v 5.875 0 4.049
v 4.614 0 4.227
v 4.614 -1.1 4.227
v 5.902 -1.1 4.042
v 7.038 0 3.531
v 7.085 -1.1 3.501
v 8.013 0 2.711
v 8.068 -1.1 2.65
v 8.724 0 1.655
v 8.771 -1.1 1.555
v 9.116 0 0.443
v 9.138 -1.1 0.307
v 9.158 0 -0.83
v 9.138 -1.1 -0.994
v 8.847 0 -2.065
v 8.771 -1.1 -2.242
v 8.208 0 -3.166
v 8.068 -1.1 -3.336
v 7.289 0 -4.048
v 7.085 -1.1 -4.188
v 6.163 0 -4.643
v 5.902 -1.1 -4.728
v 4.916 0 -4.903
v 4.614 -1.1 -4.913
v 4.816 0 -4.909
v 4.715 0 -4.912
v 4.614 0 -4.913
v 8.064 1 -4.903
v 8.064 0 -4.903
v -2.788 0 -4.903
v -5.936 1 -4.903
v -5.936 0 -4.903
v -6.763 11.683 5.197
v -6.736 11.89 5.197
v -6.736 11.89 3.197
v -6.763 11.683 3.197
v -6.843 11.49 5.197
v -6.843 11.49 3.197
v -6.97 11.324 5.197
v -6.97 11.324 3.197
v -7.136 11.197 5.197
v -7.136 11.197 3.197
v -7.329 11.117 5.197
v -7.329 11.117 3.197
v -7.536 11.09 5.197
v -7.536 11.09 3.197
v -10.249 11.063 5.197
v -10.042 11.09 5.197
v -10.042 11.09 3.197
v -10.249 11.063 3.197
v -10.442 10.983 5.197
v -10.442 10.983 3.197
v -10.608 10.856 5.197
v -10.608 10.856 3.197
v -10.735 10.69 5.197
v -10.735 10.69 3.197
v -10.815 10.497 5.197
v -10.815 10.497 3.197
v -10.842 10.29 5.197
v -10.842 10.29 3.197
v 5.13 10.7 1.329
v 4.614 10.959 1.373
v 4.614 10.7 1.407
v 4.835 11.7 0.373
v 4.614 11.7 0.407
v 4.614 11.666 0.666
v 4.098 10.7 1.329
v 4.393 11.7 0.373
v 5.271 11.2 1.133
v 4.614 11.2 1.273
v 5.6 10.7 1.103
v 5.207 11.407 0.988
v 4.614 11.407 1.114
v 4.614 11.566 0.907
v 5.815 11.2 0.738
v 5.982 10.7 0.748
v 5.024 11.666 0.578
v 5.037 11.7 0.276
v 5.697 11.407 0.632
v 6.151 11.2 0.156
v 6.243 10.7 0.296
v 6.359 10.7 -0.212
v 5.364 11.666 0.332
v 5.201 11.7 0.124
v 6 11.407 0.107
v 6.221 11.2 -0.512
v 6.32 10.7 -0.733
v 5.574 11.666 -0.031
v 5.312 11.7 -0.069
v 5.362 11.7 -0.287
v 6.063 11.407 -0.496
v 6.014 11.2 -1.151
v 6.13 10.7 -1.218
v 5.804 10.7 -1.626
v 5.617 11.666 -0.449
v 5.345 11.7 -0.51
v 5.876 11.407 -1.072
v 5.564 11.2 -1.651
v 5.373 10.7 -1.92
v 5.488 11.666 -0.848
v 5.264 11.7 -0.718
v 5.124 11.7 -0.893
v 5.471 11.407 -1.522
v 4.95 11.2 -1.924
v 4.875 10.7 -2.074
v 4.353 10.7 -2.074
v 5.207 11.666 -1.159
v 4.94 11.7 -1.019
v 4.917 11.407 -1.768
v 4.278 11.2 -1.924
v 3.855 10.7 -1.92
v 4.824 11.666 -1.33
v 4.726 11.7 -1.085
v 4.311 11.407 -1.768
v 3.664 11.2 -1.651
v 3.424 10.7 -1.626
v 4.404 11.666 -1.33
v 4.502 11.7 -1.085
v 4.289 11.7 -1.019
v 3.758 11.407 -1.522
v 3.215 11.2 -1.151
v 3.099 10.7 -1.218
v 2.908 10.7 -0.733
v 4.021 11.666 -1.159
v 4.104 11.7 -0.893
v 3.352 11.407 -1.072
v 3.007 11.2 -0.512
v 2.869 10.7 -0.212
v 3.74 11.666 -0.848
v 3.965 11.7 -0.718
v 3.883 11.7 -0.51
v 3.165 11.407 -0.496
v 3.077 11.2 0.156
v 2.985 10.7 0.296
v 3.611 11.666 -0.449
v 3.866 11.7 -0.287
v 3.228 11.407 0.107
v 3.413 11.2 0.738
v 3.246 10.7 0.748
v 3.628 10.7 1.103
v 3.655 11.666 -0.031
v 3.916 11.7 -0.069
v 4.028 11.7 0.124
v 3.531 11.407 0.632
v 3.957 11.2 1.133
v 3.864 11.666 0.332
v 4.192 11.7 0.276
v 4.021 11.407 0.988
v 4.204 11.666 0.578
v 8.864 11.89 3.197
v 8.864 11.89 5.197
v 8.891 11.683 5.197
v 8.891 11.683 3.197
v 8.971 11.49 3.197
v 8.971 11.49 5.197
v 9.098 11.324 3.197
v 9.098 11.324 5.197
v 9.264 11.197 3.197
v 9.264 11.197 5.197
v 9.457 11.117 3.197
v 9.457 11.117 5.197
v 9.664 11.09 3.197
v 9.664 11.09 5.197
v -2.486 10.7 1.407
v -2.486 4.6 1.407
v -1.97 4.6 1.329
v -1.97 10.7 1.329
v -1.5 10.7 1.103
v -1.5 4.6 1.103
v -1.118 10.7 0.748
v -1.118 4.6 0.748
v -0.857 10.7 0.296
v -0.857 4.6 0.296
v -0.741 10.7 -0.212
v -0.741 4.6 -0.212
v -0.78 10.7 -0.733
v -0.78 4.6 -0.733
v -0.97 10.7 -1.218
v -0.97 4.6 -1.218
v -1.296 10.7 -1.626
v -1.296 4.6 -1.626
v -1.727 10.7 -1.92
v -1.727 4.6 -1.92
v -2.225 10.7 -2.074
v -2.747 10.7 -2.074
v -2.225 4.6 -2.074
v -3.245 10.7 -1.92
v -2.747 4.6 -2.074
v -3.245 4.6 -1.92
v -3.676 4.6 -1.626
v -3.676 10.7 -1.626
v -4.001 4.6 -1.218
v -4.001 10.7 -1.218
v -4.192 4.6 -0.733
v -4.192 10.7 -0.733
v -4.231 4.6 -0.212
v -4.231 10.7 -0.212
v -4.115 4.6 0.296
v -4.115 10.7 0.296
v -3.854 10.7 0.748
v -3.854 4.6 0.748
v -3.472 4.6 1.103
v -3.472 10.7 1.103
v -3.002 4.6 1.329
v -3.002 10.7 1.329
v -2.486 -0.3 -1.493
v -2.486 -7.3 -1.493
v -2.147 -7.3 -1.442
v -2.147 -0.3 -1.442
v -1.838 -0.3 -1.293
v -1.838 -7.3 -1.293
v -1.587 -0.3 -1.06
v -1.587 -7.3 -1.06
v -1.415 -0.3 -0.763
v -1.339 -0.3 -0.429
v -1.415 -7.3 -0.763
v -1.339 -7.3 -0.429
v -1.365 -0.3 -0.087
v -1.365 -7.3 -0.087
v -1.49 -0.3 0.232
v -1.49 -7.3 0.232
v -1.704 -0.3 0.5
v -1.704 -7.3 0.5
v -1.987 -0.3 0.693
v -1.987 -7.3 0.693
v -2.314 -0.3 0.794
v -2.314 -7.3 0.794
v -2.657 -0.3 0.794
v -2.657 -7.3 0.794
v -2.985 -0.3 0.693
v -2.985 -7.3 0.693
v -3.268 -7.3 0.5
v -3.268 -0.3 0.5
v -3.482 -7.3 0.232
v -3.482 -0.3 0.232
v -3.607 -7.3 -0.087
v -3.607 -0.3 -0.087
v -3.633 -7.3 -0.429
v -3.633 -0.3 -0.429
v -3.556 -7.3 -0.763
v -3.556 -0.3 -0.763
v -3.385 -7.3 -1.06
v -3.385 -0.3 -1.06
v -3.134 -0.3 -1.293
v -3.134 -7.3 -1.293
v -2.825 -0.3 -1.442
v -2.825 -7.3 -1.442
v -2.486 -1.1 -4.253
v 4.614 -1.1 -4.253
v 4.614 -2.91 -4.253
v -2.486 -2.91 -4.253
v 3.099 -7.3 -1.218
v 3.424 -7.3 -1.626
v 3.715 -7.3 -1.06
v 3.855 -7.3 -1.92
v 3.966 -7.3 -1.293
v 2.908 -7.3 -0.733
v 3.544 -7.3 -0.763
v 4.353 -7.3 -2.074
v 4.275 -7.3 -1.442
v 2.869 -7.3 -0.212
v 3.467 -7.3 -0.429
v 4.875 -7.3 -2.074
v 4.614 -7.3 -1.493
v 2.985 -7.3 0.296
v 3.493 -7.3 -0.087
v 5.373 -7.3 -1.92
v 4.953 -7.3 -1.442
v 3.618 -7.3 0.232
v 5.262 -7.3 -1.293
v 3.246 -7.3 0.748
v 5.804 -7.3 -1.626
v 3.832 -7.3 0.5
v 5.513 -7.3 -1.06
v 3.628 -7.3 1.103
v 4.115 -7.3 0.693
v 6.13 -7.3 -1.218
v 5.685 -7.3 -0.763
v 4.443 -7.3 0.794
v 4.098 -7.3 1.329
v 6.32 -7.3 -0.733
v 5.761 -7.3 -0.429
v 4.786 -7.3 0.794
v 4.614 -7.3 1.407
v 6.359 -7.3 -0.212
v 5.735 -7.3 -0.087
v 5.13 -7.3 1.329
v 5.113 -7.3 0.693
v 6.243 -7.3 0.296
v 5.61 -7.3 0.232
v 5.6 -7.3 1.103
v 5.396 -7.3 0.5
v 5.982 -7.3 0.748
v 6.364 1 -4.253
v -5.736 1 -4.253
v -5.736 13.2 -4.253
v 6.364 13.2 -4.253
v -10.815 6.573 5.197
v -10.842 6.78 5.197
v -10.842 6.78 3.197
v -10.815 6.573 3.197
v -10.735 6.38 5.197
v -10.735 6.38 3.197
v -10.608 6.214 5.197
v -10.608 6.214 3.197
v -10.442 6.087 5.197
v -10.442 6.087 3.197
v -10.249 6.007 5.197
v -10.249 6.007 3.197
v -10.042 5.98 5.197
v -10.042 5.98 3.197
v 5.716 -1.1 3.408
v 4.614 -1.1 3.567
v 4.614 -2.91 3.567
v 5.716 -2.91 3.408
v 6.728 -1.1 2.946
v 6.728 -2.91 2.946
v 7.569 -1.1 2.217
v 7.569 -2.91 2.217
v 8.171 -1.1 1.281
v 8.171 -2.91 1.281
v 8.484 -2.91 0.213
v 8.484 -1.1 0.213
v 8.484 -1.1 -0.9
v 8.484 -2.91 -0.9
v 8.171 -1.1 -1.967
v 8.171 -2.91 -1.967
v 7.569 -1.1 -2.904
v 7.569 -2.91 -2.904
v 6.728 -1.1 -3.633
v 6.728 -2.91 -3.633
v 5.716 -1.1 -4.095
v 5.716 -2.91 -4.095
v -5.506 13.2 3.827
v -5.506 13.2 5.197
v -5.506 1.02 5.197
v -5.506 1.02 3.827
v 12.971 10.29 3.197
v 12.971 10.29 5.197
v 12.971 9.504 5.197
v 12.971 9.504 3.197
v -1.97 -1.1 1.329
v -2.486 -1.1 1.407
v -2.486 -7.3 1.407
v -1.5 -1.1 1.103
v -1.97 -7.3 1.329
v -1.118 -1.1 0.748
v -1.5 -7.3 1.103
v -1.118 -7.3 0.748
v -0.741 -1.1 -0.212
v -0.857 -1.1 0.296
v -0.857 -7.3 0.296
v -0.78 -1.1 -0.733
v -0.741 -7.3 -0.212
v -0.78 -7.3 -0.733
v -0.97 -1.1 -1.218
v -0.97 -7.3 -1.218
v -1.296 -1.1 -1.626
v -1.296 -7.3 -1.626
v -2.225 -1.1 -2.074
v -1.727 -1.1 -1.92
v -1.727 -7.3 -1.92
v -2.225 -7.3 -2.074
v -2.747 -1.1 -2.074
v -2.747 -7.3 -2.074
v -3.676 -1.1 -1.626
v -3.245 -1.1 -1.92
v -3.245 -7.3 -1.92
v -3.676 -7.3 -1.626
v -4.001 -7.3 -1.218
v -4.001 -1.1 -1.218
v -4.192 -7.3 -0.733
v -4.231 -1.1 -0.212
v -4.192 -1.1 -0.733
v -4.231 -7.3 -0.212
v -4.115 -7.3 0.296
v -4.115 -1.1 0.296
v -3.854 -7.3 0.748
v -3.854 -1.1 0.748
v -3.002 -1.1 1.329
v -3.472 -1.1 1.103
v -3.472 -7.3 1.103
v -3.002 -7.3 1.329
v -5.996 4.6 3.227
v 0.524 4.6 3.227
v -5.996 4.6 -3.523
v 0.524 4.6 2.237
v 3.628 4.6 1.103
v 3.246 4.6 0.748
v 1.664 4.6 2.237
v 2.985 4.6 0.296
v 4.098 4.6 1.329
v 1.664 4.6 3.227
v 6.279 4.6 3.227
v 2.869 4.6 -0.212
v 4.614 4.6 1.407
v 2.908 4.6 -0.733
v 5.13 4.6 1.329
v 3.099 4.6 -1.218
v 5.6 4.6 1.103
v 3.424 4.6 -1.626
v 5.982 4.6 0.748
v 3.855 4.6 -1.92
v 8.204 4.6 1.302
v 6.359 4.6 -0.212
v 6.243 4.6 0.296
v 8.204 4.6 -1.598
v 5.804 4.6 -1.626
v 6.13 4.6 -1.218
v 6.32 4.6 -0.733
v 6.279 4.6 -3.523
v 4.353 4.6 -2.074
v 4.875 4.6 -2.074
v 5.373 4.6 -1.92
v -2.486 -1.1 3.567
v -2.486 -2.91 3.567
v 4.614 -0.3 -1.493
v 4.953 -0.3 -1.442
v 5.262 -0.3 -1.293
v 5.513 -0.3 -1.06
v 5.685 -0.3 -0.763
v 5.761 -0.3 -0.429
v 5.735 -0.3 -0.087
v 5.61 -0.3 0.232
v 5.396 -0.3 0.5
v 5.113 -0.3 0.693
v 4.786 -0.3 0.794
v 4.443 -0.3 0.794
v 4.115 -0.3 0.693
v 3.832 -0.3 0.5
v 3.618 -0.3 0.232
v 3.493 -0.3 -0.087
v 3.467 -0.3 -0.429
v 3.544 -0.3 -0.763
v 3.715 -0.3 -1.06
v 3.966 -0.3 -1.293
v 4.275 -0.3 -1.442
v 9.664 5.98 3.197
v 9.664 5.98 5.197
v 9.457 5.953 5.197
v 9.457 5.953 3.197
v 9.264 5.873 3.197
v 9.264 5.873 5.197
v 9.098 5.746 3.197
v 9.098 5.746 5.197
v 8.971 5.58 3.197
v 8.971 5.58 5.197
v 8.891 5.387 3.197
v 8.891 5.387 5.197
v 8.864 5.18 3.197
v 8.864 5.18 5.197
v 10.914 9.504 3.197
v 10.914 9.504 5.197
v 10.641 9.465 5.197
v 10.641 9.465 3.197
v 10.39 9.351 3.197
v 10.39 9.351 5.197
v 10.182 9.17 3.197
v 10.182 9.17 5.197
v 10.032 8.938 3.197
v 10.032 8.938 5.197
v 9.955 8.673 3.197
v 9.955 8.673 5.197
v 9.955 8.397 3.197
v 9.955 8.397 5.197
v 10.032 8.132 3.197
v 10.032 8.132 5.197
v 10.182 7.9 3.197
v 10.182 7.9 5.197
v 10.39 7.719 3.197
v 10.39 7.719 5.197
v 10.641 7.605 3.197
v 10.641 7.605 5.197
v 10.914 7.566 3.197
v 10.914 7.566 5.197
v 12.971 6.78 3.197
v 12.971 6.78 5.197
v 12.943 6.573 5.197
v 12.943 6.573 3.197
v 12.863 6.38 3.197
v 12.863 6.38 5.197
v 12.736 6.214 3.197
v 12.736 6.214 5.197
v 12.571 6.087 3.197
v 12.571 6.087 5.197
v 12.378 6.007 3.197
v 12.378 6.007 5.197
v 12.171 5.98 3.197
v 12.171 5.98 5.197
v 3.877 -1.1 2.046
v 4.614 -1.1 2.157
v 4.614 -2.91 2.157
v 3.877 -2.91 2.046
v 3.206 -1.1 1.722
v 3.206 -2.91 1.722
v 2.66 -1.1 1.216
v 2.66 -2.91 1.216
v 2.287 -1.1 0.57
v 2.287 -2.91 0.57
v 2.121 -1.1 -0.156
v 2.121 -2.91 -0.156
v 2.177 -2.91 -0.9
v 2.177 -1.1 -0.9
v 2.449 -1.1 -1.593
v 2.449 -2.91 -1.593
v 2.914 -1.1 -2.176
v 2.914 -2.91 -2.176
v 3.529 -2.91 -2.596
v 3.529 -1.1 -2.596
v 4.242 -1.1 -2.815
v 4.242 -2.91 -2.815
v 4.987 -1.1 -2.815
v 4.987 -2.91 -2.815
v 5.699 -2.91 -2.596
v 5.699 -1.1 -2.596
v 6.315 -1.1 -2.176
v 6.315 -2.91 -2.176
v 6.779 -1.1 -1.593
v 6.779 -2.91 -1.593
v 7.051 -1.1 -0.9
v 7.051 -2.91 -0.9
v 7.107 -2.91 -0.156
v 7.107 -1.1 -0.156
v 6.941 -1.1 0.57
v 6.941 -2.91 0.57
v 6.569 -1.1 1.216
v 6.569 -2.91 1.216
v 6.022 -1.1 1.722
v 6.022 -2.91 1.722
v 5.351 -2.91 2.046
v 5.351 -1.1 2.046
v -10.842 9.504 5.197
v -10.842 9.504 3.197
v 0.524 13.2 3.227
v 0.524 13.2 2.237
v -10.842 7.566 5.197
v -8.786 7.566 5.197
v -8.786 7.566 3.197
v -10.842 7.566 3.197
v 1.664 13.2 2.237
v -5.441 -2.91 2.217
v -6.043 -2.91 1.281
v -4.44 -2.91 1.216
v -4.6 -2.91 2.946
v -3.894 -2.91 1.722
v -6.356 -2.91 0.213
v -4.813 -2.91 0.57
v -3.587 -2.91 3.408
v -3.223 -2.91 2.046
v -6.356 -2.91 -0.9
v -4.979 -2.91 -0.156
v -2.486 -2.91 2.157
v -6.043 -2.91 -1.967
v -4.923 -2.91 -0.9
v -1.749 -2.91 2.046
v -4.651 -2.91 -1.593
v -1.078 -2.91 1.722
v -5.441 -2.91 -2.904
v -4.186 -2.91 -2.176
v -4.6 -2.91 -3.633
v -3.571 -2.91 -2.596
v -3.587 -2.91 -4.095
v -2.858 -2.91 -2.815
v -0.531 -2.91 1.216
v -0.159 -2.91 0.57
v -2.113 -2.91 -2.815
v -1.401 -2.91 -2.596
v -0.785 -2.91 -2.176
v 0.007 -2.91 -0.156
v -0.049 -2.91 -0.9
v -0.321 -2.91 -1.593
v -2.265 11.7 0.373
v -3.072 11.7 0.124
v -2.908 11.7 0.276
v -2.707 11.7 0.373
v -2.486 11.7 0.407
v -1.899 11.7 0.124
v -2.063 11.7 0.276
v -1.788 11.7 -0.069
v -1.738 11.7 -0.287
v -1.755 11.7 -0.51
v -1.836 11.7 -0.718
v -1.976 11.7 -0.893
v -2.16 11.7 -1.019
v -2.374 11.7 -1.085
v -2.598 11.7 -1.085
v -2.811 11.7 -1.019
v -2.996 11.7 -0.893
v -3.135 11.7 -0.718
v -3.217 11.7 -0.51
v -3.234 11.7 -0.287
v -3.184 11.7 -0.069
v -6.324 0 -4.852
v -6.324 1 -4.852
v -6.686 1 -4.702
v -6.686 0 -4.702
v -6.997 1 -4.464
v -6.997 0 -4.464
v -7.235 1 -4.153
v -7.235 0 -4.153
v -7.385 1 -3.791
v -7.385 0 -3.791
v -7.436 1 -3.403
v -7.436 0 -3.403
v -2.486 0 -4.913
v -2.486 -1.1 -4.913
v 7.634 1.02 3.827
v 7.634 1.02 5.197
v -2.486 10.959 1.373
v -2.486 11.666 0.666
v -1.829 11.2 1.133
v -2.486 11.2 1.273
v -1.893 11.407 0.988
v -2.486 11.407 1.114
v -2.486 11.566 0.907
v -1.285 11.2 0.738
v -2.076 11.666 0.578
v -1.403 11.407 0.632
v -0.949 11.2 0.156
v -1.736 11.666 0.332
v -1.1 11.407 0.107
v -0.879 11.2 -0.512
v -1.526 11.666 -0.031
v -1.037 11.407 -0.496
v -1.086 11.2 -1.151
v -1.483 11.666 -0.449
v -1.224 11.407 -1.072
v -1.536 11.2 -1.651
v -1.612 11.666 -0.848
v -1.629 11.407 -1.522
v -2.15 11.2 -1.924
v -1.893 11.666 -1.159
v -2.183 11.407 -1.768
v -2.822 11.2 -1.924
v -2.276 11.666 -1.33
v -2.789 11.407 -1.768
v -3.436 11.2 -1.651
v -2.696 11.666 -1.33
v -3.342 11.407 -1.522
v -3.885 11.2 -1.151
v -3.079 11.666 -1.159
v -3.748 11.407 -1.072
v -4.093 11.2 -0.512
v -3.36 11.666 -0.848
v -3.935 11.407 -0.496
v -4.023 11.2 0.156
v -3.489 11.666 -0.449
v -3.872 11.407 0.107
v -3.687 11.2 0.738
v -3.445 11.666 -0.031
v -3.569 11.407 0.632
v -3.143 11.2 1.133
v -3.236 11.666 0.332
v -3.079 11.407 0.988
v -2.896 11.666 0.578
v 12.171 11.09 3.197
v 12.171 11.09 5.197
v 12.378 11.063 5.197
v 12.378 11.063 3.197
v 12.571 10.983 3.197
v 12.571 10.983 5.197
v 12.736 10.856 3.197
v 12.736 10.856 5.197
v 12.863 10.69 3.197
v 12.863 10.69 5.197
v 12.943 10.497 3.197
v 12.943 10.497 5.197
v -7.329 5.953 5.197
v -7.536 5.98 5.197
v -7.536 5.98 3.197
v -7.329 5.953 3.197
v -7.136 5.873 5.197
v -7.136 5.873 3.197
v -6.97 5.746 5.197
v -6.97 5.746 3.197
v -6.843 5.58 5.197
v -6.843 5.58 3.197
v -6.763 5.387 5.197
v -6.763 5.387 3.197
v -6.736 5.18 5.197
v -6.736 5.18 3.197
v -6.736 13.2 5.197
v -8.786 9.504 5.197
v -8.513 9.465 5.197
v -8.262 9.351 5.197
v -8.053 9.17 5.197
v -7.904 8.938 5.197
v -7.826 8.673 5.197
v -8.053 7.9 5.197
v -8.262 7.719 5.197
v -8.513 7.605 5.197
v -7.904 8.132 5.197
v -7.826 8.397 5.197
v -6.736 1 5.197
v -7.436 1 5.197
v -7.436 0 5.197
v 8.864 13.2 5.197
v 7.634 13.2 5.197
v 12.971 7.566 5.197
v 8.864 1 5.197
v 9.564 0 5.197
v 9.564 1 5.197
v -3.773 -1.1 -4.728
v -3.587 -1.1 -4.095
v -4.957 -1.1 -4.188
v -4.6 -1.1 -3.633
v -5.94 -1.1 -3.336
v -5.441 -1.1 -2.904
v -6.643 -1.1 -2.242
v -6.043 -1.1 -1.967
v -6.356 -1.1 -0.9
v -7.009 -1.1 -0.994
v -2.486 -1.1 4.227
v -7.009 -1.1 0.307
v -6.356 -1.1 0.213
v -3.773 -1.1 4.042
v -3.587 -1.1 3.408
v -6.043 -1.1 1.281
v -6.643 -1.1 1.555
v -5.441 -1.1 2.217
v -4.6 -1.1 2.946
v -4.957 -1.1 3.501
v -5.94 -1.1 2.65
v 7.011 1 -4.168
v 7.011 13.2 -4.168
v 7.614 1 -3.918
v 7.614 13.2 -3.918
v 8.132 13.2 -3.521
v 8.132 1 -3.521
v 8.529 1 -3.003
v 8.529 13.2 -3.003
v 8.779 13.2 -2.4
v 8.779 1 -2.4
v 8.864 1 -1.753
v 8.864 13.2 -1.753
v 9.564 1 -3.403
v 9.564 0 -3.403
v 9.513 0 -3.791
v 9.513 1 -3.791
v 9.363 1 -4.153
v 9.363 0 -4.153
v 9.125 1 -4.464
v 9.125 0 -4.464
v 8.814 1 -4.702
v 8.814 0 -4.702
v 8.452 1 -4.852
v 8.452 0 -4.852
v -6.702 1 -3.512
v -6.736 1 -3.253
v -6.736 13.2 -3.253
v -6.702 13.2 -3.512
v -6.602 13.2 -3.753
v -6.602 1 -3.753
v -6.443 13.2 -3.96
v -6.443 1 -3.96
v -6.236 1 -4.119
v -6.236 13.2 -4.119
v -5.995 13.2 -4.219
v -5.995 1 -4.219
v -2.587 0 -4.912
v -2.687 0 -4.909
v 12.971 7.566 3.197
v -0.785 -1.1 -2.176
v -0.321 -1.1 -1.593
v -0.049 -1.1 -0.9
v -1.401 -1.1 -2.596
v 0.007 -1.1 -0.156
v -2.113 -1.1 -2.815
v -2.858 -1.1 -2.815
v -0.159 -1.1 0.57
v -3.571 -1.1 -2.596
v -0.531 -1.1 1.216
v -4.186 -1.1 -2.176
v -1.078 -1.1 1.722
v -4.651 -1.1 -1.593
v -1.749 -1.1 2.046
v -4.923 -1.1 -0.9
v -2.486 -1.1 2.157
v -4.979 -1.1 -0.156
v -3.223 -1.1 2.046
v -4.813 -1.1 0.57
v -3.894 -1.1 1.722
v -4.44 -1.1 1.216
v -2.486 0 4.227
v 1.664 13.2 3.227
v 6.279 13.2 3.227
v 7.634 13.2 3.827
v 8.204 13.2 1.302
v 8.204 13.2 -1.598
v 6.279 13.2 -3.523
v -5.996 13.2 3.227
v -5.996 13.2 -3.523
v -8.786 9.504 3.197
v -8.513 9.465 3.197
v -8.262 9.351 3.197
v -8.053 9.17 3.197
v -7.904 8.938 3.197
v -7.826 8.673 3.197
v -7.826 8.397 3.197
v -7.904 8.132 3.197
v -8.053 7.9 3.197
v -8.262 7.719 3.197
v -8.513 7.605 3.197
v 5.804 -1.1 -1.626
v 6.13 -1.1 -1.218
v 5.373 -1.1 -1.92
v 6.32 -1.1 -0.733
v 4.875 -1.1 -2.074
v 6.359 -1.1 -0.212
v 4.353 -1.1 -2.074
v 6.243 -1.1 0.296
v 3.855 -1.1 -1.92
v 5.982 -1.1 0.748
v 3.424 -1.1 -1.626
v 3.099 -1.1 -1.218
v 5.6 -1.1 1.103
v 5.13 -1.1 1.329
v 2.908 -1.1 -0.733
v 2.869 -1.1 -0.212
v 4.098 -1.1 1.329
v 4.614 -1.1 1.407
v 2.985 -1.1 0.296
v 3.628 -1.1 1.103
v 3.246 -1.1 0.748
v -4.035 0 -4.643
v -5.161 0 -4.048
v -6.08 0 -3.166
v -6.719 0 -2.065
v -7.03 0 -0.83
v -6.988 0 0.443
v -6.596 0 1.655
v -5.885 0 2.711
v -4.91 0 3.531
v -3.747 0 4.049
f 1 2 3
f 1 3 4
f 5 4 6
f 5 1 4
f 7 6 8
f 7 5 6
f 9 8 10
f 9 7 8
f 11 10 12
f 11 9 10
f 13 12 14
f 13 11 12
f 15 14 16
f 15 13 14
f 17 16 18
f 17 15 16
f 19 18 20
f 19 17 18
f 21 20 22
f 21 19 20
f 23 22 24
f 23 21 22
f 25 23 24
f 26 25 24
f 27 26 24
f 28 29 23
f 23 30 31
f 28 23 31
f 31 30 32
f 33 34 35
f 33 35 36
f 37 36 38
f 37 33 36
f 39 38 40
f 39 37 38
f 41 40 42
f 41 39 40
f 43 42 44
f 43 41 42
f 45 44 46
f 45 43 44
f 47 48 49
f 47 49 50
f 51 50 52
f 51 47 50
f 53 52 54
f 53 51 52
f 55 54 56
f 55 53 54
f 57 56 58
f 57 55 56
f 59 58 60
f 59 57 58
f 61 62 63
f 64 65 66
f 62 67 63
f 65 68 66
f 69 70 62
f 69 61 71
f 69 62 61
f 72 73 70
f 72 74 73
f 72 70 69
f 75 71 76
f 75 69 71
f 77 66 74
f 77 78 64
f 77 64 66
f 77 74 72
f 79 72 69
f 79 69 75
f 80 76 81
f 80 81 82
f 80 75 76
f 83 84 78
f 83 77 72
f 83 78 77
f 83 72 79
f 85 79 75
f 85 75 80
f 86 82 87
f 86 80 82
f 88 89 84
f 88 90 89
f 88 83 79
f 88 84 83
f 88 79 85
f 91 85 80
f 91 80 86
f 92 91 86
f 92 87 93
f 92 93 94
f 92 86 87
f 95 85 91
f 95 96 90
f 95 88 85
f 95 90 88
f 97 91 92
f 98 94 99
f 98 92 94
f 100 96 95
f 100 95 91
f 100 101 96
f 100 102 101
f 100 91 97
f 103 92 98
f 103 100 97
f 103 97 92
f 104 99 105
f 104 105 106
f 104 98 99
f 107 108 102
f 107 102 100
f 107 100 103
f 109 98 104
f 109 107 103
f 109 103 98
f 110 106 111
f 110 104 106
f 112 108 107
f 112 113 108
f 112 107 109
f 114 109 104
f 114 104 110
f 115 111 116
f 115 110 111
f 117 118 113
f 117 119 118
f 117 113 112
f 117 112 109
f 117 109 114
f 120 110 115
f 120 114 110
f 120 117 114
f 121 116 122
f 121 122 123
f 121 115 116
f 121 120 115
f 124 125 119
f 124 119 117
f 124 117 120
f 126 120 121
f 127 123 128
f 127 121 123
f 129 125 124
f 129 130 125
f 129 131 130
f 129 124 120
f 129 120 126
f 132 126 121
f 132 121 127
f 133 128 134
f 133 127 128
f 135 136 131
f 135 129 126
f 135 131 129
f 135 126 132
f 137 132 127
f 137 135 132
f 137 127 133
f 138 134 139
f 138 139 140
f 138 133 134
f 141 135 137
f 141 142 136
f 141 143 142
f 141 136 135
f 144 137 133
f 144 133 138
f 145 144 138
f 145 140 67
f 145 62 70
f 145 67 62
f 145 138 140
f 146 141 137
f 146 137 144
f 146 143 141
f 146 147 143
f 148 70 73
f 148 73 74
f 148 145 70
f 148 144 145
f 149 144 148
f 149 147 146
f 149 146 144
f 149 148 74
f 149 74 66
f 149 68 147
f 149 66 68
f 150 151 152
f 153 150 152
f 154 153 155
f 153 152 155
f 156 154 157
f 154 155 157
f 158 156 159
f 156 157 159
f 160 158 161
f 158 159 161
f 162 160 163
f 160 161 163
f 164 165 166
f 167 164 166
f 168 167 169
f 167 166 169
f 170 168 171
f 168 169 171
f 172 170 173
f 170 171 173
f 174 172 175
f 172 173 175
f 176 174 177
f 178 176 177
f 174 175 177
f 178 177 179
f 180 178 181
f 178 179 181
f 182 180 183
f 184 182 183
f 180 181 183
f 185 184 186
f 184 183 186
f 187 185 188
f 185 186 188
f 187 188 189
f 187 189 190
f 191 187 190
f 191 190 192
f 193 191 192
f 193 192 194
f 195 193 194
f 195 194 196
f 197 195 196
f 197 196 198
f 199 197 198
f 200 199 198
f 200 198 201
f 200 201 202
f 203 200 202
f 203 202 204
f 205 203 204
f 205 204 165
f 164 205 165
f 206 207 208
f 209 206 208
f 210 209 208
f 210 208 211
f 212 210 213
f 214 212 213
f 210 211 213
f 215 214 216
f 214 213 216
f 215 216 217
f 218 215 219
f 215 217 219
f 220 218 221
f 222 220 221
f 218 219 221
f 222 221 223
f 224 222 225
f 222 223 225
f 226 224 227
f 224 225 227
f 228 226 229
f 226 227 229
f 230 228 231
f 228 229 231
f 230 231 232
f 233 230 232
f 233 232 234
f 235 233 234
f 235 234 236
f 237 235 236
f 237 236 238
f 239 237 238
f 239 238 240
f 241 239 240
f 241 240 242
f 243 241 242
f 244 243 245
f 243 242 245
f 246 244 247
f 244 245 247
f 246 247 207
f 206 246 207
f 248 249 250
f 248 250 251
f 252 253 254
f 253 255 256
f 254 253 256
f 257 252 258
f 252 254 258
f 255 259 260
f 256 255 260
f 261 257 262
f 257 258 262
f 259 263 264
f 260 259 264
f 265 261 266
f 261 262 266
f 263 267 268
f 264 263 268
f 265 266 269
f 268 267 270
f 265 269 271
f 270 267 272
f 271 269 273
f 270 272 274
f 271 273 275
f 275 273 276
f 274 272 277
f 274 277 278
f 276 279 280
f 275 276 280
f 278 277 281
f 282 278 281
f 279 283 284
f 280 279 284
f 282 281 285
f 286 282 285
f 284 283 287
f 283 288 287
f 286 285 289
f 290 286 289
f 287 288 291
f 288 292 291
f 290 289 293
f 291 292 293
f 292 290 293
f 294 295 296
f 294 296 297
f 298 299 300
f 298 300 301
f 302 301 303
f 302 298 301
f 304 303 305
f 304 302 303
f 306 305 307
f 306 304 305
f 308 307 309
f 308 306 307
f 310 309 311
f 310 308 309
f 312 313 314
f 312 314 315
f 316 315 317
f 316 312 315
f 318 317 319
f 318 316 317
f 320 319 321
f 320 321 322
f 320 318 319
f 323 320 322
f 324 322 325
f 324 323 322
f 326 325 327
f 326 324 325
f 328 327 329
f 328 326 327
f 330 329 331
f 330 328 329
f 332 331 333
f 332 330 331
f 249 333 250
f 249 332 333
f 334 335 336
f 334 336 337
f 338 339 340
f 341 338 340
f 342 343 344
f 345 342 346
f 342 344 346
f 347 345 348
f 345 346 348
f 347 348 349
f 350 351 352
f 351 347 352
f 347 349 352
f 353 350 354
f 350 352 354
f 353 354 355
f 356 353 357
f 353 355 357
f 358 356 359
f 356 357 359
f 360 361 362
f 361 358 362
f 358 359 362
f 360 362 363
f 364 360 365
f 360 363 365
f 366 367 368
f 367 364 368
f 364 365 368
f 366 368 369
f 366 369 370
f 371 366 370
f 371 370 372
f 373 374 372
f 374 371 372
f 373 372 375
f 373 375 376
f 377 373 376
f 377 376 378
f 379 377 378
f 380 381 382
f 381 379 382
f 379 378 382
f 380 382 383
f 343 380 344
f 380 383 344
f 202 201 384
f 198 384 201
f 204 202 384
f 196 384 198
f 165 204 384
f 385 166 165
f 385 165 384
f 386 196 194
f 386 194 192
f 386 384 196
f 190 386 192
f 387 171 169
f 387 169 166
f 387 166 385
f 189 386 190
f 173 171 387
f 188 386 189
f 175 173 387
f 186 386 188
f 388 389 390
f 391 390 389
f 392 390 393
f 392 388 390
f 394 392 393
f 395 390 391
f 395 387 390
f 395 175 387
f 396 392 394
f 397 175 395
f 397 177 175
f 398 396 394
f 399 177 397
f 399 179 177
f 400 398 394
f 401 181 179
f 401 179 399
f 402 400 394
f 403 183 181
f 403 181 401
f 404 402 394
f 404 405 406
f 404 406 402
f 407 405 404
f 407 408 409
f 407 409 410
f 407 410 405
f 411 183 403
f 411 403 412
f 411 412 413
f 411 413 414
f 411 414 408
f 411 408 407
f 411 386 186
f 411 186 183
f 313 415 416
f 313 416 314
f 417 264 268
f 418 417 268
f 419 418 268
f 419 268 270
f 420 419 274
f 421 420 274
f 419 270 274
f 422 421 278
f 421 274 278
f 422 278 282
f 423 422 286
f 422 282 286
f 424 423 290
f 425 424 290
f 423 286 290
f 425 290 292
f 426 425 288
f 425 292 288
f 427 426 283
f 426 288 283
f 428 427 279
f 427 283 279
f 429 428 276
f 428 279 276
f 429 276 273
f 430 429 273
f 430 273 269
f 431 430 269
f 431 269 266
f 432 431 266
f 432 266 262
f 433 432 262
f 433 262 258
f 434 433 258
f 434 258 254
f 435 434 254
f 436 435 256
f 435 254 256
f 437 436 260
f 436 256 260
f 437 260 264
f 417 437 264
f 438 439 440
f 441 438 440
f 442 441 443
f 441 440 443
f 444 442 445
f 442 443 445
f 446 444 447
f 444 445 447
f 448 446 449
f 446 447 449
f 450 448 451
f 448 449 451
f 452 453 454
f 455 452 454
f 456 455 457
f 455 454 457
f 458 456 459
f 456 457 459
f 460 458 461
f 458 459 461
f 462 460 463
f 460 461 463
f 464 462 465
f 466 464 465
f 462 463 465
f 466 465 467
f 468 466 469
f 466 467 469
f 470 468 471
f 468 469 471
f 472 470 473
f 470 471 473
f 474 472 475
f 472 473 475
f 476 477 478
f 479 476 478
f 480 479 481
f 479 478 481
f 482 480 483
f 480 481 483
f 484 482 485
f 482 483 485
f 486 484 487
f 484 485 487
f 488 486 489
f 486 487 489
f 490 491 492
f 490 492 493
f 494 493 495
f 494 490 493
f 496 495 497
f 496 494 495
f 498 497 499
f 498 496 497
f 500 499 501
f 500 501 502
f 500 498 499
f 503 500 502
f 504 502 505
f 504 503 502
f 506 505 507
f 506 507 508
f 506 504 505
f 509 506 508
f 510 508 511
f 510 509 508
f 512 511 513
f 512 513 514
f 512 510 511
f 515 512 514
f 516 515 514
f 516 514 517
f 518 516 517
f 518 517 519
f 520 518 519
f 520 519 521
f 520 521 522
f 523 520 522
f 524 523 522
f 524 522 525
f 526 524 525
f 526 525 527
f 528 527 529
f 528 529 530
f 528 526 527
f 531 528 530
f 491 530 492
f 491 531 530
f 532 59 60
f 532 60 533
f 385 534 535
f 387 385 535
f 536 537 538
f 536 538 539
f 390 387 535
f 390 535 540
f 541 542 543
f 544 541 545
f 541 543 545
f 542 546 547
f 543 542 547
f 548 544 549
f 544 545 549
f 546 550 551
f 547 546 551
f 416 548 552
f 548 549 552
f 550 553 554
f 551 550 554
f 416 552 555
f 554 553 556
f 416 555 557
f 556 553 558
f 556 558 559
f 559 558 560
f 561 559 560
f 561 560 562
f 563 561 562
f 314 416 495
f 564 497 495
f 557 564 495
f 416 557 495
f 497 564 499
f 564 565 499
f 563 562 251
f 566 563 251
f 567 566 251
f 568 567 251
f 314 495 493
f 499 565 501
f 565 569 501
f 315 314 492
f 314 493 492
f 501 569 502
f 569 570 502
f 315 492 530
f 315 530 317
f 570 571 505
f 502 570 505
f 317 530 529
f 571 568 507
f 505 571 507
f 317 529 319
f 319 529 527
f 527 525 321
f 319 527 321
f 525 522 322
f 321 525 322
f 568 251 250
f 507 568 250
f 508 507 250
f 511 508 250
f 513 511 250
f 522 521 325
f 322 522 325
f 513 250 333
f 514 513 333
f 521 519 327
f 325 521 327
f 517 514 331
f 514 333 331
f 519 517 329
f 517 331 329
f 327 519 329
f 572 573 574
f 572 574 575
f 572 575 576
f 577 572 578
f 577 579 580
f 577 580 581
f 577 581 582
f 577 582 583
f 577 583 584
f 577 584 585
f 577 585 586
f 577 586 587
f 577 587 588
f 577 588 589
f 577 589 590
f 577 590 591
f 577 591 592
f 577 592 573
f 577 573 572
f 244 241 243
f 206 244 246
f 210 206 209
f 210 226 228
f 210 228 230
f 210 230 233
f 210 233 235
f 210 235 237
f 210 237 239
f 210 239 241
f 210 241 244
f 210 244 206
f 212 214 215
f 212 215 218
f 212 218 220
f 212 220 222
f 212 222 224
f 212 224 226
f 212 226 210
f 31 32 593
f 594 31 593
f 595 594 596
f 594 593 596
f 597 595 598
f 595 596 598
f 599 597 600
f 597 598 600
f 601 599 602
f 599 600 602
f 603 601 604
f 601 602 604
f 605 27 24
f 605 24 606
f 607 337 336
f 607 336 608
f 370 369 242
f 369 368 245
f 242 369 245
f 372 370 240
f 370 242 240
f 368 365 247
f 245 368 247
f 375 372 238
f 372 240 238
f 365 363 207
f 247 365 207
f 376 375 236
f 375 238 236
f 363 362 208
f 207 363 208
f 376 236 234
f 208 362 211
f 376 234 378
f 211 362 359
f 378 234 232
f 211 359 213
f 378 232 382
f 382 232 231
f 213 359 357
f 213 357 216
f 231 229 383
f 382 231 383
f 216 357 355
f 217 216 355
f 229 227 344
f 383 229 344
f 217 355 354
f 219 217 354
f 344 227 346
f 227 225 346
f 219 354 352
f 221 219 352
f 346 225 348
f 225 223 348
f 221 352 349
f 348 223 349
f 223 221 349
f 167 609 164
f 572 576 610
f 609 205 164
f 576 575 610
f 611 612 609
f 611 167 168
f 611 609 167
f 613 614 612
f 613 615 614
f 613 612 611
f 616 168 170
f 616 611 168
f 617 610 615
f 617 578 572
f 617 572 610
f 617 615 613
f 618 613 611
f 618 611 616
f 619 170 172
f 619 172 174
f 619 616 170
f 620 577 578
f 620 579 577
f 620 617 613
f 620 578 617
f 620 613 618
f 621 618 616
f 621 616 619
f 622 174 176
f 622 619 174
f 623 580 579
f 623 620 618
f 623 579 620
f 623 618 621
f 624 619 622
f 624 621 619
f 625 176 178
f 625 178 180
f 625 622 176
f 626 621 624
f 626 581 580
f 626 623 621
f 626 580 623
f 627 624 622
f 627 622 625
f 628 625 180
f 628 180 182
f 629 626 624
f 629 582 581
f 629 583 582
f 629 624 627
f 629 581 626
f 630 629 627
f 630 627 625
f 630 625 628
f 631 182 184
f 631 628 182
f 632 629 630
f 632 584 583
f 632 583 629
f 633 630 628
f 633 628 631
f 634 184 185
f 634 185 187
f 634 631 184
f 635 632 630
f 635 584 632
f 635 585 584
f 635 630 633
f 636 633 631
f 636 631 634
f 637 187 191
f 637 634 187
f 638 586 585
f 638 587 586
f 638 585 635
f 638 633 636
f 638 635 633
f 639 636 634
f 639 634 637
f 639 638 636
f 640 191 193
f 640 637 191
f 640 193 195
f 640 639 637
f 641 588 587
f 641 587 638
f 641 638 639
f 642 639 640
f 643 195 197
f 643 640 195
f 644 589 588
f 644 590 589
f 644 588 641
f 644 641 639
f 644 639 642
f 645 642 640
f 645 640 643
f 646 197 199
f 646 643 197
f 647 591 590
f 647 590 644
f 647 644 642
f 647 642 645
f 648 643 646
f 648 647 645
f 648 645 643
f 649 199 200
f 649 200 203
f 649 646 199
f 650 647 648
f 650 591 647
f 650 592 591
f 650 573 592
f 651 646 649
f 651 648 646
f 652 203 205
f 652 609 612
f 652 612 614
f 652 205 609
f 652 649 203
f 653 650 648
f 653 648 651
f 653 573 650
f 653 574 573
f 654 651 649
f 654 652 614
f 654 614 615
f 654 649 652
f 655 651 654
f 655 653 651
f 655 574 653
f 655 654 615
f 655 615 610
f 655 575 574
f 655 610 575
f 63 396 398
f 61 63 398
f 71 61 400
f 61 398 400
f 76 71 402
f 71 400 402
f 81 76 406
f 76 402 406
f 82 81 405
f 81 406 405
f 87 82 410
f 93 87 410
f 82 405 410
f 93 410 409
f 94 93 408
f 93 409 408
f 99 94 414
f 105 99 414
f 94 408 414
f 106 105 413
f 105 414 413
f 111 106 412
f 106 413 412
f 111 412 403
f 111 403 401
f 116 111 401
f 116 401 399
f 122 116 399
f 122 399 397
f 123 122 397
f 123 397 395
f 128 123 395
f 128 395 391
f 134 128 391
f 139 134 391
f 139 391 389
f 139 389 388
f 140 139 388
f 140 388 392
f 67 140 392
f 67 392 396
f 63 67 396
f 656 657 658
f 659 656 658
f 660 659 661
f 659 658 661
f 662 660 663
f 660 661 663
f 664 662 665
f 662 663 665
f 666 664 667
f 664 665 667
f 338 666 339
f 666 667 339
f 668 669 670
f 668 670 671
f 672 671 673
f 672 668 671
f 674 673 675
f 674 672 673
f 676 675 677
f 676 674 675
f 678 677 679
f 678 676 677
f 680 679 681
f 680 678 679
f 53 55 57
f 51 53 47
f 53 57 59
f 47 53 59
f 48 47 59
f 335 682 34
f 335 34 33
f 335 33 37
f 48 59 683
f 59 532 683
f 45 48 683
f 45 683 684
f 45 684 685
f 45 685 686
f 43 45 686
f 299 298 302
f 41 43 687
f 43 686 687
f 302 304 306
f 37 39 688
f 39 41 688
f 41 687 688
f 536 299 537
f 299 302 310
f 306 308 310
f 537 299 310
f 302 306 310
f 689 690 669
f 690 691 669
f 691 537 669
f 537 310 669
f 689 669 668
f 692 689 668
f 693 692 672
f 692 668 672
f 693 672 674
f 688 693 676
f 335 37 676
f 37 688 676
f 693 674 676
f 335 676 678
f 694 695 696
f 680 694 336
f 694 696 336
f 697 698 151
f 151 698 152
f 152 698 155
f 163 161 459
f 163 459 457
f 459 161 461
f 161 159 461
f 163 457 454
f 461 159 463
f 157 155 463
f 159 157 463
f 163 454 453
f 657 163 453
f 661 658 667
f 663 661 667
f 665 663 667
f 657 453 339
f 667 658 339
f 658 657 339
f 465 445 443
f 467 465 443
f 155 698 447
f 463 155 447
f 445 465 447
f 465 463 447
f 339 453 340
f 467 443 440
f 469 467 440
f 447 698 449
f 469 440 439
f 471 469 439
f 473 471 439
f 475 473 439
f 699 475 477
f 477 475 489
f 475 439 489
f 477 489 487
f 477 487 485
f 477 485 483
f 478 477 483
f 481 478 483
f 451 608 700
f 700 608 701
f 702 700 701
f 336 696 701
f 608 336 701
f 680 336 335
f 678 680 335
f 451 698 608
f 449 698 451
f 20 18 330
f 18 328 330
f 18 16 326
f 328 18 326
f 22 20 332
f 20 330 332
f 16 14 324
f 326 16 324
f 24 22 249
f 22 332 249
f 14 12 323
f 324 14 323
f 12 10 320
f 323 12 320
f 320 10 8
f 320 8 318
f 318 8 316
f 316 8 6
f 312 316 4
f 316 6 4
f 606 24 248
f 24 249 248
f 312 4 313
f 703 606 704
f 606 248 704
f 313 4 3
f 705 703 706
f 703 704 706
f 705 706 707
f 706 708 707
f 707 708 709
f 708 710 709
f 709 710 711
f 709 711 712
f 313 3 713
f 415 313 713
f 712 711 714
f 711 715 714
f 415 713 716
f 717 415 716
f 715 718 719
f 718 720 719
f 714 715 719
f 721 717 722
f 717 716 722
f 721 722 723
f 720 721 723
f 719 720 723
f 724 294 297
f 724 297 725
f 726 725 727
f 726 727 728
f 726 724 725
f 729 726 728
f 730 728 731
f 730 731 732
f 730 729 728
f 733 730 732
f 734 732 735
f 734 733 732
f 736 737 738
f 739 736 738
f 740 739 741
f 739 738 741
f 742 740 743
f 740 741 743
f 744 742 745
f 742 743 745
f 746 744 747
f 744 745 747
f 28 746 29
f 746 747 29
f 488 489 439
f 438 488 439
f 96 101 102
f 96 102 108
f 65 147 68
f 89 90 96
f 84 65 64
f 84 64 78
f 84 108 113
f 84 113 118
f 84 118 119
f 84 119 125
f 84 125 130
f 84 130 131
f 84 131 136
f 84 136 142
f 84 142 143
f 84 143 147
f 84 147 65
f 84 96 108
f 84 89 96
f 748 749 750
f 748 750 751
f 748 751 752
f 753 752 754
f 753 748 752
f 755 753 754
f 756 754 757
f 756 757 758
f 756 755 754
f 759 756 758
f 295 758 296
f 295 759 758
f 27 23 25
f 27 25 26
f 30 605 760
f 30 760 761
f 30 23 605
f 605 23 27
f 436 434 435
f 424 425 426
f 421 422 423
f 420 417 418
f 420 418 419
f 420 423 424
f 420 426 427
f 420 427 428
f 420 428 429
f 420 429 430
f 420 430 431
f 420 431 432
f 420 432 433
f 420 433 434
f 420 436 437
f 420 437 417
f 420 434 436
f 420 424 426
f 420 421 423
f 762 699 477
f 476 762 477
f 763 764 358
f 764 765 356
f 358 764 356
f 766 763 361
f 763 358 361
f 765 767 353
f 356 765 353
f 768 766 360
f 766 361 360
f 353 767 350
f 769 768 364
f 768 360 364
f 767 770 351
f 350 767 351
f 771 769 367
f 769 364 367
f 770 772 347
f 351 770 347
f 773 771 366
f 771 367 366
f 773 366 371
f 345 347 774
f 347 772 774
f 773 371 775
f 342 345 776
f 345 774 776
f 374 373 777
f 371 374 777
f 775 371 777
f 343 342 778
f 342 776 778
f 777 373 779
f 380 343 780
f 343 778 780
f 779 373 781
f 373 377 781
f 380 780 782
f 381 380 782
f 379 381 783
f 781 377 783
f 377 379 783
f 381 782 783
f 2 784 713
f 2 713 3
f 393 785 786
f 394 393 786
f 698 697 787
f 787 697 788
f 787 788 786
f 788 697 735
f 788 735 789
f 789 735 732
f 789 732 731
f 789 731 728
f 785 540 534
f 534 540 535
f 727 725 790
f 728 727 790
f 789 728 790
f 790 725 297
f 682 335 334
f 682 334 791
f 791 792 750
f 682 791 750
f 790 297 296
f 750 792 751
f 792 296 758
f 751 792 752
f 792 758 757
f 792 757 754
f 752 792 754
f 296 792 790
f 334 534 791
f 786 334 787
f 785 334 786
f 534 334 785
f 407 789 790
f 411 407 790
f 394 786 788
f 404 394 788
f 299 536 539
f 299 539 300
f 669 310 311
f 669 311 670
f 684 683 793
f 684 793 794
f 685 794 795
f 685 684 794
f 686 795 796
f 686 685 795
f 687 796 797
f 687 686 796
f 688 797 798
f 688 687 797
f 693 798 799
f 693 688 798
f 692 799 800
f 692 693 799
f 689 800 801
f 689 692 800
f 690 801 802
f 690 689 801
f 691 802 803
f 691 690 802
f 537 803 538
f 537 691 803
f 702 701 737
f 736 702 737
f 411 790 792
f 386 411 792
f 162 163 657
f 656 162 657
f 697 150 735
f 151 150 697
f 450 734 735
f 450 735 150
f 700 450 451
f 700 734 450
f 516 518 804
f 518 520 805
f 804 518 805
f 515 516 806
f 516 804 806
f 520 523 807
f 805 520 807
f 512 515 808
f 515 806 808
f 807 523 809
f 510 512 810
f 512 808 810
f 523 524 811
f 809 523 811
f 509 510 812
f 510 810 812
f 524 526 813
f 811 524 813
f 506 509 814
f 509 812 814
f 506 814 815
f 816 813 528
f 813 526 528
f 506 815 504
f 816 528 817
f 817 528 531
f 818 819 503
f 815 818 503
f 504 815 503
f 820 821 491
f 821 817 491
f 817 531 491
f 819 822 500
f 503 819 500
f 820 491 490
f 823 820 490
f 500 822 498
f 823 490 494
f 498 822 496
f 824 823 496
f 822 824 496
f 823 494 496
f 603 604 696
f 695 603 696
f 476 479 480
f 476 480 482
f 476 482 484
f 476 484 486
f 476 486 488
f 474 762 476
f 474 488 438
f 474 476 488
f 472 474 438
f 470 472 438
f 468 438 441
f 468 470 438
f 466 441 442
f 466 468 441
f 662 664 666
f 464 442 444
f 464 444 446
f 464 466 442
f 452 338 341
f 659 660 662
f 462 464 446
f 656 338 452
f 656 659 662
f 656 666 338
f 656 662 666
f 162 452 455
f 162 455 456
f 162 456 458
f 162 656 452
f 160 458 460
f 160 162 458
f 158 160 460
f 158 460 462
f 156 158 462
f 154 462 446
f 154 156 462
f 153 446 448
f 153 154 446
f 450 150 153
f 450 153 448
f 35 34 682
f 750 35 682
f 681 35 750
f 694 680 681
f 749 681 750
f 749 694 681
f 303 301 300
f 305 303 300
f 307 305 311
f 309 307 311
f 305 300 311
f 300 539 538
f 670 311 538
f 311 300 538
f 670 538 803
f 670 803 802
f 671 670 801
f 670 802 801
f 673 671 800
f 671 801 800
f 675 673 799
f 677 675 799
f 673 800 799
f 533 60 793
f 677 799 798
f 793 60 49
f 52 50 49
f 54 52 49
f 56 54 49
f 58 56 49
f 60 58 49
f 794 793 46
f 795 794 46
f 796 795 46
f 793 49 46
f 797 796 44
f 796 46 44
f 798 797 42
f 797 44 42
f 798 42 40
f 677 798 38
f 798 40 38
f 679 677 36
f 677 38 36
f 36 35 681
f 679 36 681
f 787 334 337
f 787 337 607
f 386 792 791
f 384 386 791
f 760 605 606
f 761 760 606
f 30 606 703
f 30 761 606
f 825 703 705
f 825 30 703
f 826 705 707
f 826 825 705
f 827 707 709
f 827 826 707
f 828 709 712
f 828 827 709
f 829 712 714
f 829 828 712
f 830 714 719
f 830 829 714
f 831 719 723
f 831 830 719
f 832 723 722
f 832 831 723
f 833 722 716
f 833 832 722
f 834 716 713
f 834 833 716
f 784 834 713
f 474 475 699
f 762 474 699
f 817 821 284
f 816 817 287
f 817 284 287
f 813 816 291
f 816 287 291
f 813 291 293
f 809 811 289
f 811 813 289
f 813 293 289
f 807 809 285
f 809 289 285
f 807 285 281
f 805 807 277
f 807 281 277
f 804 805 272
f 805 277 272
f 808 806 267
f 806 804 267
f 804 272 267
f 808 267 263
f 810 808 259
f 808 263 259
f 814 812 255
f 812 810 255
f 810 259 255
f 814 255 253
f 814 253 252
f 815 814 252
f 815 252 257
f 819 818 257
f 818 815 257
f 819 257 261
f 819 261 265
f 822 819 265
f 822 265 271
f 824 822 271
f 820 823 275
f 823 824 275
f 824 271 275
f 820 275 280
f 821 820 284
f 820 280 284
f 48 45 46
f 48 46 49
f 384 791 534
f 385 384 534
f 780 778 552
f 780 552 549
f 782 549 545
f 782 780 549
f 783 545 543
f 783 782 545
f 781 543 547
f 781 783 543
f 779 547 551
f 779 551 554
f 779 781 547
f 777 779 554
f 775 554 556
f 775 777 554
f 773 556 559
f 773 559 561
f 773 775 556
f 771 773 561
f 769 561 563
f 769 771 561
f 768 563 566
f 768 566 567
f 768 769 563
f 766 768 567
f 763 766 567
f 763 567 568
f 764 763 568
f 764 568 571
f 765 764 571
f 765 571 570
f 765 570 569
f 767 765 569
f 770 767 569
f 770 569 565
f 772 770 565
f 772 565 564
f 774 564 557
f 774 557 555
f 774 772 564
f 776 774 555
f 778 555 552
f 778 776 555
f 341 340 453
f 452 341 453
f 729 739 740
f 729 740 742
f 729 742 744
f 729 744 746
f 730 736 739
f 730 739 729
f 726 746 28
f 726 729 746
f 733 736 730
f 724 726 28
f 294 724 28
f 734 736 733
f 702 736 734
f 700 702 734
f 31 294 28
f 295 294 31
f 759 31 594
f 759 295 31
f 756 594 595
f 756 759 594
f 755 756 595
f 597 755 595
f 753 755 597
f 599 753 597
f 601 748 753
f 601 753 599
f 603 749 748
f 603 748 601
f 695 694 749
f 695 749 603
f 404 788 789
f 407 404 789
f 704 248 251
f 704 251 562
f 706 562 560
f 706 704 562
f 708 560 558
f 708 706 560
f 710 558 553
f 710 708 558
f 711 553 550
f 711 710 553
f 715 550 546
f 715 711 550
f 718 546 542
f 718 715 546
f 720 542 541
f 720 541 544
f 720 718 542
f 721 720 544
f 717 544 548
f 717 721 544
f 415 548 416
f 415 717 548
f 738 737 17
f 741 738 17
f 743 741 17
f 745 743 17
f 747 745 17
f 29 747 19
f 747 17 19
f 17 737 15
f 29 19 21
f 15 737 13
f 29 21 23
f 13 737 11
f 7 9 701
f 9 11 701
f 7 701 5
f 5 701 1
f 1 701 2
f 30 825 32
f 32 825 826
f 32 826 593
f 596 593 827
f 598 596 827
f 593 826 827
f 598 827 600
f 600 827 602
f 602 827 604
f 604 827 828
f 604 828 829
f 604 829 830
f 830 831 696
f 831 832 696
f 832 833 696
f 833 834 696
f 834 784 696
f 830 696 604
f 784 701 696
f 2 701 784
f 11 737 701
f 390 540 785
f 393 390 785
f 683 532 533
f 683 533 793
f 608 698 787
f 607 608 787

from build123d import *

# Parameters (mm, degrees)
BOSS_EXTRUDE1_DEPTH        = 13.2
CUT_EXTRUDE1_DEPTH         = 8.6
BOSS_EXTRUDE2_DEPTH        = 7.1
BOSS_EXTRUDE2_DEPTH_BACK   = 11.9
SKETCH3_R                  = 1.75
BOSS_EXTRUDE2_2_DEPTH      = 7.1
BOSS_EXTRUDE2_2_DEPTH_BACK = 11.9
SKETCH4_W                  = 13.14
SKETCH4_H                  = 1.37
CUT_EXTRUDE2_DEPTH         = 12.18
BOSS_EXTRUDE3_DEPTH        = 1
BOSS_EXTRUDE4_DEPTH        = 1.1
SKETCH7_R                  = 2.5
BOSS_EXTRUDE5_DEPTH        = 1.81
SKETCH8_R                  = 1.15
CUT_EXTRUDE3_DEPTH         = 7
BOSS_EXTRUDE6_DEPTH        = 2
FILLET1_R                  = 1


with BuildPart() as part:
    # Sketch1 → Boss-Extrude1 (new body)
    with BuildSketch(Plane(origin=(0, 0, 0), x_dir=(1, 0, 0), z_dir=(0, 1, 0))):
        with BuildLine():
            Line((8.864150943, 1.753207547), (8.864150943, -5.196792453))
            Line((8.864150943, -5.196792453), (-6.735849057, -5.196792453))
            Line((-6.735849057, -5.196792453), (-6.735849057, 3.253207547))
            ThreePointArc((-6.735849057, 3.253207547), (-6.442955838, 3.960314328), (-5.735849057, 4.253207547))
            Line((-5.735849057, 4.253207547), (6.364150943, 4.253207547))
            ThreePointArc((6.364150943, 4.253207547), (8.131917896, 3.5209745), (8.864150943, 1.753207547))
        make_face()
    extrude(amount=BOSS_EXTRUDE1_DEPTH)

    # Sketch2 → Cut-Extrude1 (cut)
    with BuildSketch(Plane(origin=(0, 13.2, 0), x_dir=(1, 0, 0), z_dir=(0, 1, 0))):
        Polygon((-5.995849057, 3.523207547), (-5.995849057, -3.226792453), (0.524150943, -3.226792453), (0.524150943, -2.236792453), (1.664150943, -2.236792453), (1.664150943, -3.226792453), (6.279150943, -3.226792453), (8.204150943, -1.301792453), (8.204150943, 1.598207547), (6.279150943, 3.523207547), align=None)
    extrude(amount=-CUT_EXTRUDE1_DEPTH, mode=Mode.SUBTRACT)

    # Sketch4 → Cut-Extrude2 (cut)
    with BuildSketch(Plane(origin=(0, 13.2, 0), x_dir=(1, 0, 0), z_dir=(0, 1, 0))):
        with Locations((1.064150943, -4.511792453)):
            Rectangle(SKETCH4_W, SKETCH4_H)
    extrude(amount=-CUT_EXTRUDE2_DEPTH, mode=Mode.SUBTRACT)



with BuildPart() as body_2:
    # Sketch3 → Boss-Extrude2 (new, two sides: drawn at the far end of the back side and taken through both)
    with BuildSketch(Plane(origin=(0, 4.6, 0), x_dir=(1, 0, 0), z_dir=(0, 1, 0)).offset(-BOSS_EXTRUDE2_DEPTH_BACK)):
        with Locations(Location((-2.485849057, 0.343207547, 0), (0, 0, 270))):
            Circle(SKETCH3_R)
    extrude(amount=BOSS_EXTRUDE2_DEPTH + BOSS_EXTRUDE2_DEPTH_BACK)


with BuildPart() as body_3:
    # Sketch3 → Boss-Extrude2 2 (new, two sides: drawn at the far end of the back side and taken through both)
    with BuildSketch(Plane(origin=(0, 4.6, 0), x_dir=(1, 0, 0), z_dir=(0, 1, 0)).offset(-BOSS_EXTRUDE2_2_DEPTH_BACK)):
        with Locations(Location((4.614150943, 0.343207547, 0), (0, 0, 270))):
            Circle(SKETCH3_R)
    extrude(amount=BOSS_EXTRUDE2_2_DEPTH + BOSS_EXTRUDE2_2_DEPTH_BACK)


with BuildPart() as part_1:
    add(part.part)

    add(body_2.part)  # Boss-Extrude3 merges body 2

    add(body_3.part)  # Boss-Extrude3 merges body 3
    # Sketch5 → Boss-Extrude3 (add)
    with BuildSketch(Plane.XZ):
        with BuildLine():
            Line((-7.435849057, 5.196792453), (9.564150943, 5.196792453))
            Line((9.564150943, 5.196792453), (9.564150943, -3.403207547))
            ThreePointArc((9.564150943, -3.403207547), (9.124811115, -4.463867719), (8.064150943, -4.903207547))
            Line((8.064150943, -4.903207547), (-5.935849057, -4.903207547))
            ThreePointArc((-5.935849057, -4.903207547), (-6.996509228, -4.463867719), (-7.435849057, -3.403207547))
            Line((-7.435849057, -3.403207547), (-7.435849057, 5.196792453))
        make_face()
    extrude(amount=-BOSS_EXTRUDE3_DEPTH)

    # Sketch6 → Boss-Extrude4 (add)
    with BuildSketch(Plane.XZ):
        with BuildLine():
            Line((-2.485849057, 4.226792453), (4.614150943, 4.226792453))
            ThreePointArc((4.614150943, 4.226792453), (9.184150943, -0.343207547), (4.614150943, -4.913207547))
            Line((4.614150943, -4.913207547), (-2.485849057, -4.913207547))
            ThreePointArc((-2.485849057, -4.913207547), (-7.055849057, -0.343207547), (-2.485849057, 4.226792453))
        make_face()
    extrude(amount=BOSS_EXTRUDE4_DEPTH)

    # Sketch7 → Boss-Extrude5 (add)
    with BuildSketch(Plane(origin=(0, -1.1, 0), x_dir=(-1, 0, 0), z_dir=(0, -1, 0))):
        with BuildLine():
            Line((2.485849057, -3.566792453), (-4.614150943, -3.566792453))
            ThreePointArc((-4.614150943, -3.566792453), (-8.524150943, 0.343207547), (-4.614150943, 4.253207547))
            Line((-4.614150943, 4.253207547), (2.485849057, 4.253207547))
            ThreePointArc((2.485849057, 4.253207547), (6.395849057, 0.343207547), (2.485849057, -3.566792453))
        make_face()
        with Locations(Location((2.485849057, 0.343207547, 0), (0, 0, 270))):
            Circle(SKETCH7_R, mode=Mode.SUBTRACT)
        with Locations(Location((-4.614150943, 0.343207547, 0), (0, 0, 270))):
            Circle(SKETCH7_R, mode=Mode.SUBTRACT)
    extrude(amount=BOSS_EXTRUDE5_DEPTH)

    # Sketch8 → Cut-Extrude3 (cut)
    with BuildSketch(Plane.XZ.offset(7.3)):
        with Locations(Location((4.614150943, -0.343207547, 0), (0, 0, 270))):
            Circle(SKETCH8_R)
        with Locations(Location((-2.485849057, -0.343207547, 0), (0, 0, 270))):
            Circle(SKETCH8_R)
    extrude(amount=-CUT_EXTRUDE3_DEPTH, mode=Mode.SUBTRACT)

    # Sketch9 → Boss-Extrude6 (add)
    with BuildSketch(Plane.XY.offset(5.196792453)):
        with BuildLine():
            Line((-7.535849057, 11.09), (-10.042204833, 11.09))
            ThreePointArc((-10.042204833, 11.09), (-10.607890258, 10.855685425), (-10.842204833, 10.29))
            Line((-10.842204833, 10.29), (-10.842204833, 9.50439657))
            Line((-10.842204833, 9.50439657), (-8.785849057, 9.50439657))
            ThreePointArc((-8.785849057, 9.50439657), (-7.816452486, 8.535), (-8.785849057, 7.56560343))
            Line((-8.785849057, 7.56560343), (-10.842204833, 7.56560343))
            Line((-10.842204833, 7.56560343), (-10.842204833, 6.78))
            ThreePointArc((-10.842204833, 6.78), (-10.607890258, 6.214314575), (-10.042204833, 5.98))
            Line((-10.042204833, 5.98), (-7.535849057, 5.98))
            ThreePointArc((-7.535849057, 5.98), (-6.970163632, 5.745685425), (-6.735849057, 5.18))
            Line((-6.735849057, 5.18), (-6.735849057, 11.89))
            ThreePointArc((-6.735849057, 11.89), (-6.970163632, 11.324314575), (-7.535849057, 11.09))
        make_face()
        with BuildLine():
            Line((12.97050672, 7.56560343), (12.97050672, 6.78))
            ThreePointArc((12.97050672, 6.78), (12.736192145, 6.214314575), (12.17050672, 5.98))
            Line((12.17050672, 5.98), (9.664150943, 5.98))
            ThreePointArc((9.664150943, 5.98), (9.098465518, 5.745685425), (8.864150943, 5.18))
            Line((8.864150943, 5.18), (8.864150943, 11.89))
            ThreePointArc((8.864150943, 11.89), (9.098465518, 11.324314575), (9.664150943, 11.09))
            Line((9.664150943, 11.09), (12.17050672, 11.09))
            ThreePointArc((12.17050672, 11.09), (12.736192145, 10.855685425), (12.97050672, 10.29))
            Line((12.97050672, 10.29), (12.97050672, 9.50439657))
            Line((12.97050672, 9.50439657), (10.914150943, 9.50439657))
            ThreePointArc((10.914150943, 9.50439657), (9.944754373, 8.535), (10.914150943, 7.56560343))
            Line((10.914150943, 7.56560343), (12.97050672, 7.56560343))
        make_face()
    extrude(amount=-BOSS_EXTRUDE6_DEPTH)

    # Fillet1
    fillet1_edges = [part_1.edges().sort_by_distance(p)[0] for p in [
        (-2.485849057, 11.7, -2.093207547),
        (4.614150943, 11.7, -2.093207547),
    ]]
    fillet(fillet1_edges, radius=FILLET1_R)


solid = part_1.part
